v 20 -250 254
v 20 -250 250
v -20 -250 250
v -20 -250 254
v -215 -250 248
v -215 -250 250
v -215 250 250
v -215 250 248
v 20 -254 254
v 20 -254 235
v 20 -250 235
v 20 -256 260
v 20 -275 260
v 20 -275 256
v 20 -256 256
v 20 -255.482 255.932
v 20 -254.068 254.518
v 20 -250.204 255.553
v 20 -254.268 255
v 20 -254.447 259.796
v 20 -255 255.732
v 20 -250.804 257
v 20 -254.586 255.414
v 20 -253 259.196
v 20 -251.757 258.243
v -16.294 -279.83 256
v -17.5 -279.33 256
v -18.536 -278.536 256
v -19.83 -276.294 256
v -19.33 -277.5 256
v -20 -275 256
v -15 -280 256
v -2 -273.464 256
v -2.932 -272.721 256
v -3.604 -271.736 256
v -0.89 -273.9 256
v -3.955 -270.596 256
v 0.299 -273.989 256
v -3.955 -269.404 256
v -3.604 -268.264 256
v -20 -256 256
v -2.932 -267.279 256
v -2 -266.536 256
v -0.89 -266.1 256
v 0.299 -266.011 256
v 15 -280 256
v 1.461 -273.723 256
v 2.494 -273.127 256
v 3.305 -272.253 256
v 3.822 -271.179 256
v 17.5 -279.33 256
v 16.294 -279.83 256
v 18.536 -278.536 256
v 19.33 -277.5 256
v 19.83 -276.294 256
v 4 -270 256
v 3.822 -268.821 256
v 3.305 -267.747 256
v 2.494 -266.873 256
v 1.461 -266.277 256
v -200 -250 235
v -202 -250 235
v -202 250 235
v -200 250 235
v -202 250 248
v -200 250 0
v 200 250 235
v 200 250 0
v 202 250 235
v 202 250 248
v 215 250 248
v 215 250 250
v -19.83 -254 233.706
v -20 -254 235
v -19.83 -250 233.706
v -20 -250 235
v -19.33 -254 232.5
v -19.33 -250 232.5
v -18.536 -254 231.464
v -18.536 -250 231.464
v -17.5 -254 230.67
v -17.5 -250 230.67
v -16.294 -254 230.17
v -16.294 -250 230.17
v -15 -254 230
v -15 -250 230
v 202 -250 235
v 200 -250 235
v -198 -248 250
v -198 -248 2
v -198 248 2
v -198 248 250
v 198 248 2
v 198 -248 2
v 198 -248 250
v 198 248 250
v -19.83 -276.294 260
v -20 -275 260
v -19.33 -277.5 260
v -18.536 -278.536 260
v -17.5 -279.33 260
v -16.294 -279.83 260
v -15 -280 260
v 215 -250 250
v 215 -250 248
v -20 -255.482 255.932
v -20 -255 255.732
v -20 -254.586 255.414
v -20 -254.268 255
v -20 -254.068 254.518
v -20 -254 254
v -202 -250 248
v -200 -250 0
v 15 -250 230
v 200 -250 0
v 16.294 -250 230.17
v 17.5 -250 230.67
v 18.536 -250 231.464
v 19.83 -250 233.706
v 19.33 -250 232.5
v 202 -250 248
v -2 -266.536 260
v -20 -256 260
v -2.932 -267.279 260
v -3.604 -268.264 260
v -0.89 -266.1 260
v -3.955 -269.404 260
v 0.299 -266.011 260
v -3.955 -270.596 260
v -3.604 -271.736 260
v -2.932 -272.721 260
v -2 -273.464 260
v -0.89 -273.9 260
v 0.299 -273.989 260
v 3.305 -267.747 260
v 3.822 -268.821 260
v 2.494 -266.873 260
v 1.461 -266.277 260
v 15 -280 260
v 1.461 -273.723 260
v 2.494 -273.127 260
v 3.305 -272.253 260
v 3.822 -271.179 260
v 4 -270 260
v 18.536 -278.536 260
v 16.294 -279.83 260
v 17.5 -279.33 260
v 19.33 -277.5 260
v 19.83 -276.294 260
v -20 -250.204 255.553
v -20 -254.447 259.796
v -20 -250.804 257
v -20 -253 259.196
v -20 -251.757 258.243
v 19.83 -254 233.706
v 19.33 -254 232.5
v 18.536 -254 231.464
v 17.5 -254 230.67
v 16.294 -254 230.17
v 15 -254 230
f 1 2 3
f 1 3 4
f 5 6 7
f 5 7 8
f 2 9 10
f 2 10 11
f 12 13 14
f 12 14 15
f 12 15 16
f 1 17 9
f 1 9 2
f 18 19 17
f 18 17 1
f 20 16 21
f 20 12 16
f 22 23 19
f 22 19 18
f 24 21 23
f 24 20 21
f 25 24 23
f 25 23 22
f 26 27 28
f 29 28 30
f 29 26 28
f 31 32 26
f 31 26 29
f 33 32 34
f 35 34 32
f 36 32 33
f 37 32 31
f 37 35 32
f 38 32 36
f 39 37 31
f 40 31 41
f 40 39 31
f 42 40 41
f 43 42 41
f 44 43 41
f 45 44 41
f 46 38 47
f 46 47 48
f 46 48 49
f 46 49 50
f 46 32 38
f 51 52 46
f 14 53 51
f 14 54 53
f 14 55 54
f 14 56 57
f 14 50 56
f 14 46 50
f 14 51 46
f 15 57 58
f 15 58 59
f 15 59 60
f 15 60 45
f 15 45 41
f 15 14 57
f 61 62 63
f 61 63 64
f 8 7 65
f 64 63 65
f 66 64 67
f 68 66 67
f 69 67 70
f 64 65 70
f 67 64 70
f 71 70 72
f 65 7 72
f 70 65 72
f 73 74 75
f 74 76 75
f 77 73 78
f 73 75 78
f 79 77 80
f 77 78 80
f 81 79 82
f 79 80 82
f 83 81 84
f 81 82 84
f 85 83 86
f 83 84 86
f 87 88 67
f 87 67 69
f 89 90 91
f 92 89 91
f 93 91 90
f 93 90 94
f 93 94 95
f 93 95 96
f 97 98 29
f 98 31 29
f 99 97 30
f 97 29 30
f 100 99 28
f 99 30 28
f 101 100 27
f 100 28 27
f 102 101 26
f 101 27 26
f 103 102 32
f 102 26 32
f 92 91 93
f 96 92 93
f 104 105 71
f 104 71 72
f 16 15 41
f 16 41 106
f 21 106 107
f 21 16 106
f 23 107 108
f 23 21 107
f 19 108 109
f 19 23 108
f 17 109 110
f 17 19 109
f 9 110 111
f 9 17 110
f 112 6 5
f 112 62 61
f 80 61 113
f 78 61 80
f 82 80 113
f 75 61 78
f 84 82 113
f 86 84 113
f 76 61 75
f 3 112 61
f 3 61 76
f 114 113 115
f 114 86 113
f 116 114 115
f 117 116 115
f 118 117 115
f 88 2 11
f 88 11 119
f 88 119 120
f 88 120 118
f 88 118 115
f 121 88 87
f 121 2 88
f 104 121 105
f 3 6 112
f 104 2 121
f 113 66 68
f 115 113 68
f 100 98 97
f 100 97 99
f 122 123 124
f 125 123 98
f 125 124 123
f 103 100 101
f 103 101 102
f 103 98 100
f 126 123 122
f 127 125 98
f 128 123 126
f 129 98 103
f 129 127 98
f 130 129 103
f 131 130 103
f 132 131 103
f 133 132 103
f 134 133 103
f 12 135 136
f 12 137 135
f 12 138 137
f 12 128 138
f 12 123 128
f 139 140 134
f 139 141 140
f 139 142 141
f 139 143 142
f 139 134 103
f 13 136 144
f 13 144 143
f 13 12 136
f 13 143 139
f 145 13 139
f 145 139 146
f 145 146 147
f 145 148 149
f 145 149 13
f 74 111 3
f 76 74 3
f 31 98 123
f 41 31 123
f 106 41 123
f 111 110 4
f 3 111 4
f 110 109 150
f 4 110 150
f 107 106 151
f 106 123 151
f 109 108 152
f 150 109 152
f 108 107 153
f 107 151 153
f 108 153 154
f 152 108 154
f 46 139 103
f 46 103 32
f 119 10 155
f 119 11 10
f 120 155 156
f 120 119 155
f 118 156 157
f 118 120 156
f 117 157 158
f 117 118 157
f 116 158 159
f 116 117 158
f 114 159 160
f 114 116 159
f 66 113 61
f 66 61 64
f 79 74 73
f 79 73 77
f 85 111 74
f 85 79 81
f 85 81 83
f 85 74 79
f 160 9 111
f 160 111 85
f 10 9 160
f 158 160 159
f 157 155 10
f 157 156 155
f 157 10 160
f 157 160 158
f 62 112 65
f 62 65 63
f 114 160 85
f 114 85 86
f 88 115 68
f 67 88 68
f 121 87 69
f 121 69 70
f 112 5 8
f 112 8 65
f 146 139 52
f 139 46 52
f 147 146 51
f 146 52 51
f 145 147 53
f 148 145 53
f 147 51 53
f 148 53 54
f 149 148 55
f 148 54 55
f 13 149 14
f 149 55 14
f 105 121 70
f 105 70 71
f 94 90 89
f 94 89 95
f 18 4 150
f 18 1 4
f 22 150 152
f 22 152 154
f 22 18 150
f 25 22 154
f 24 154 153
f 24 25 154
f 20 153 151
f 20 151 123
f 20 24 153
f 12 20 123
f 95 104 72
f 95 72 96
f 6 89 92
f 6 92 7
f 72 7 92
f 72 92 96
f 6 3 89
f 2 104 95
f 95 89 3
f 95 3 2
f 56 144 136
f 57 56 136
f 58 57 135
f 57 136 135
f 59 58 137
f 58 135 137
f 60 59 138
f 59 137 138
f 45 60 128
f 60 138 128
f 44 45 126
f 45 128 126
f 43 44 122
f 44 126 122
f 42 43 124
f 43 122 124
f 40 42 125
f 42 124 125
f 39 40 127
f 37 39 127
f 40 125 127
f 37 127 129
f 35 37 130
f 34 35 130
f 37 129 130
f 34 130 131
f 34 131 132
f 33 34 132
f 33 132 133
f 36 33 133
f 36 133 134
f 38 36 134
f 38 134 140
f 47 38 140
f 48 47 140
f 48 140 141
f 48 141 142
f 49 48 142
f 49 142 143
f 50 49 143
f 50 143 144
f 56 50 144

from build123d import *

# Parameters (mm, degrees)
F0_W      = 400
F0_H      = 500
F1_DEPTH  = 2
F2_W      = 400
F2_H      = 500
F2_W_2    = 396
F2_H_2    = 496
F3_DEPTH  = 248
F5_DEPTH  = 500
F7_DEPTH  = 20
F8_R      = 5
F10_R     = 4
F11_DEPTH = 25
F12_R     = 5


with BuildPart() as f1:
    # F0 (on Top) → F1 (new body)
    with BuildSketch(Plane.XY):
        Rectangle(F0_W, F0_H)
    extrude(amount=F1_DEPTH)

    # F2 (on face) → F3 (join)
    with BuildSketch(Plane.XY.offset(2)):
        Rectangle(F2_W, F2_H)
        Rectangle(F2_W_2, F2_H_2, mode=Mode.SUBTRACT)
    extrude(amount=F3_DEPTH)

    # F4 (on face) → F5 (join)
    with BuildSketch(Plane.XZ.offset(250)):
        Polygon((215, 250), (200, 250), (200, 235), (202, 235), (202, 248), (215, 248), align=None)
        Polygon((-200, 235), (-200, 250), (-215, 250), (-215, 248), (-202, 248), (-202, 235), align=None)
    extrude(amount=-F5_DEPTH)

    # F6 (on Right) → F7 (join, symmetric)
    with BuildSketch(Plane.YZ):
        with BuildLine():
            Line((-256, 260), (-280, 260))
            Line((-280, 260), (-280, 256))
            Line((-280, 256), (-256, 256))
            ThreePointArc((-256, 256), (-254.585786, 255.414214), (-254, 254))
            Line((-254, 254), (-254, 230))
            Line((-254, 230), (-250, 230))
            Line((-250, 230), (-250, 254))
            ThreePointArc((-250, 254), (-251.757359, 258.242641), (-256, 260))
        make_face()
    extrude(amount=F7_DEPTH, both=True)

    # F8
    f8_edges = [f1.edges().sort_by_distance(p)[0] for p in [
        (20, -280, 258),
        (-20, -280, 258),
    ]]
    fillet(f8_edges, radius=F8_R)

    # F10 (on face) → F11 (cut)
    with BuildSketch(Plane.XY.offset(260)):
        with Locations((0, -270)):
            Circle(F10_R)
    extrude(amount=-F11_DEPTH, mode=Mode.SUBTRACT)

    # F12
    f12_edges = [f1.edges().sort_by_distance(p)[0] for p in [
        (20, -252, 230),
        (-20, -252, 230),
    ]]
    fillet(f12_edges, radius=F12_R)


solid = f1.part
